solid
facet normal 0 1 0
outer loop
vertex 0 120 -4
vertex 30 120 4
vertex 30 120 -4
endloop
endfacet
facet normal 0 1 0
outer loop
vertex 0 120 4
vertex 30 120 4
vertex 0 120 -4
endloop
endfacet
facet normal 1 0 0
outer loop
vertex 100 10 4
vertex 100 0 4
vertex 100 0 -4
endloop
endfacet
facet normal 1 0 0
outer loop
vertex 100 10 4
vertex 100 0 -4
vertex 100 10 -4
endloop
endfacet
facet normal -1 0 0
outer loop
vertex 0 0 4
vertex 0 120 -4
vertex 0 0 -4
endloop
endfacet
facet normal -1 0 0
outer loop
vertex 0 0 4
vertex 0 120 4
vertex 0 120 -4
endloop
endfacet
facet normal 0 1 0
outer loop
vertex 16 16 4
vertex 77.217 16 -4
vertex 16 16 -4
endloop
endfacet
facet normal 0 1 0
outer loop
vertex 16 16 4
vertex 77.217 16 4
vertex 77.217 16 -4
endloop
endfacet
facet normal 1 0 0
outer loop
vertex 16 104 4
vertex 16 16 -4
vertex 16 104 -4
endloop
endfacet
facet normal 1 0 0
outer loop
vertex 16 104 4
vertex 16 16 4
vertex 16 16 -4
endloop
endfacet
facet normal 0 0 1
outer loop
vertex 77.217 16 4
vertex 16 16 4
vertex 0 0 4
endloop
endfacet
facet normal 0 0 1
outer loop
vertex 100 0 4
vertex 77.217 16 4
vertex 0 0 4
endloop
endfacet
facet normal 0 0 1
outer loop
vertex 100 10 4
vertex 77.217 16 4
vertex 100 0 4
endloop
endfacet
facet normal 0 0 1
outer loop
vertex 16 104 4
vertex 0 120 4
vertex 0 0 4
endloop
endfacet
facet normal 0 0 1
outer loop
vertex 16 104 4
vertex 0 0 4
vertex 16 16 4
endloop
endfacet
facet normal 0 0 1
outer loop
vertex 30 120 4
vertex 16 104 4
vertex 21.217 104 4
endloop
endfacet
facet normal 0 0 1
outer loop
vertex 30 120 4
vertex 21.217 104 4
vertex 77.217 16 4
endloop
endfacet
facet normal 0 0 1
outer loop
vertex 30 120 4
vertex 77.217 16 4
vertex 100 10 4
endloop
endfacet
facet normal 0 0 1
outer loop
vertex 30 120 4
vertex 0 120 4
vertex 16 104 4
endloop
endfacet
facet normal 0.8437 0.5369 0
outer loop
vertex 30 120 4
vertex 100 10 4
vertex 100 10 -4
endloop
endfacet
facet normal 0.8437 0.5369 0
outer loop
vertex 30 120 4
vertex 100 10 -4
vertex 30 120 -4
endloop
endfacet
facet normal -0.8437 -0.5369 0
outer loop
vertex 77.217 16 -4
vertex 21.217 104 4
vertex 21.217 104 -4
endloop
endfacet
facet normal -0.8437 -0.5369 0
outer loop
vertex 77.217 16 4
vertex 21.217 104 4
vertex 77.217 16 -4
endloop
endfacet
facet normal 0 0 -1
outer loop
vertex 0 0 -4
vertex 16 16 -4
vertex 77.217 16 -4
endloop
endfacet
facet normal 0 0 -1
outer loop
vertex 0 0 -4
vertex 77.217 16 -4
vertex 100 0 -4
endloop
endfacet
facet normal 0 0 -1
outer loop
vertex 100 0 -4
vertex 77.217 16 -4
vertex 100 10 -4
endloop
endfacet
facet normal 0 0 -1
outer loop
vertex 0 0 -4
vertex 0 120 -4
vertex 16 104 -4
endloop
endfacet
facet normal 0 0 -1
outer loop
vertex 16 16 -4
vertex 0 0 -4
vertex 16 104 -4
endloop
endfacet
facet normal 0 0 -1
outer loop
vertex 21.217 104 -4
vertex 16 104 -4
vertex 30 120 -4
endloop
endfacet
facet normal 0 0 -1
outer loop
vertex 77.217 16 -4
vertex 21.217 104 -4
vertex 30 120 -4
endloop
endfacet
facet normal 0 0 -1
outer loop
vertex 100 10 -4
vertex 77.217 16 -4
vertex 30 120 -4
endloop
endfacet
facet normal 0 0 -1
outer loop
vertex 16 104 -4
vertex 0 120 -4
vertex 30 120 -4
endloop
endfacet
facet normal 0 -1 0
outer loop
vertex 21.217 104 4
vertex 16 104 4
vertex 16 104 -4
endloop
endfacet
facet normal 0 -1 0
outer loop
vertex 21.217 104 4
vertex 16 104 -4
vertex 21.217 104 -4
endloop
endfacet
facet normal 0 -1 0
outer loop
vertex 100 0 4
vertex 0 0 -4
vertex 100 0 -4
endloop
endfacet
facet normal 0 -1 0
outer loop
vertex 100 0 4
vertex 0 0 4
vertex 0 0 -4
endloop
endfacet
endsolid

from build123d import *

# Parameters (mm, degrees)
EXTRUDE_1_DEPTH = 4


with BuildPart() as part:
    # 草图1 → 凸台-拉伸1 (new, symmetric)
    with BuildSketch(Plane.XY):
        Polygon((0, 0), (100, 0), (100, 10), (30, 120), (0, 120), align=None)
        Polygon((16, 104), (21.21686573, 104), (77.21686573, 16), (16, 16), align=None, mode=Mode.SUBTRACT)
    extrude(amount=EXTRUDE_1_DEPTH, both=True)


solid = part.part
